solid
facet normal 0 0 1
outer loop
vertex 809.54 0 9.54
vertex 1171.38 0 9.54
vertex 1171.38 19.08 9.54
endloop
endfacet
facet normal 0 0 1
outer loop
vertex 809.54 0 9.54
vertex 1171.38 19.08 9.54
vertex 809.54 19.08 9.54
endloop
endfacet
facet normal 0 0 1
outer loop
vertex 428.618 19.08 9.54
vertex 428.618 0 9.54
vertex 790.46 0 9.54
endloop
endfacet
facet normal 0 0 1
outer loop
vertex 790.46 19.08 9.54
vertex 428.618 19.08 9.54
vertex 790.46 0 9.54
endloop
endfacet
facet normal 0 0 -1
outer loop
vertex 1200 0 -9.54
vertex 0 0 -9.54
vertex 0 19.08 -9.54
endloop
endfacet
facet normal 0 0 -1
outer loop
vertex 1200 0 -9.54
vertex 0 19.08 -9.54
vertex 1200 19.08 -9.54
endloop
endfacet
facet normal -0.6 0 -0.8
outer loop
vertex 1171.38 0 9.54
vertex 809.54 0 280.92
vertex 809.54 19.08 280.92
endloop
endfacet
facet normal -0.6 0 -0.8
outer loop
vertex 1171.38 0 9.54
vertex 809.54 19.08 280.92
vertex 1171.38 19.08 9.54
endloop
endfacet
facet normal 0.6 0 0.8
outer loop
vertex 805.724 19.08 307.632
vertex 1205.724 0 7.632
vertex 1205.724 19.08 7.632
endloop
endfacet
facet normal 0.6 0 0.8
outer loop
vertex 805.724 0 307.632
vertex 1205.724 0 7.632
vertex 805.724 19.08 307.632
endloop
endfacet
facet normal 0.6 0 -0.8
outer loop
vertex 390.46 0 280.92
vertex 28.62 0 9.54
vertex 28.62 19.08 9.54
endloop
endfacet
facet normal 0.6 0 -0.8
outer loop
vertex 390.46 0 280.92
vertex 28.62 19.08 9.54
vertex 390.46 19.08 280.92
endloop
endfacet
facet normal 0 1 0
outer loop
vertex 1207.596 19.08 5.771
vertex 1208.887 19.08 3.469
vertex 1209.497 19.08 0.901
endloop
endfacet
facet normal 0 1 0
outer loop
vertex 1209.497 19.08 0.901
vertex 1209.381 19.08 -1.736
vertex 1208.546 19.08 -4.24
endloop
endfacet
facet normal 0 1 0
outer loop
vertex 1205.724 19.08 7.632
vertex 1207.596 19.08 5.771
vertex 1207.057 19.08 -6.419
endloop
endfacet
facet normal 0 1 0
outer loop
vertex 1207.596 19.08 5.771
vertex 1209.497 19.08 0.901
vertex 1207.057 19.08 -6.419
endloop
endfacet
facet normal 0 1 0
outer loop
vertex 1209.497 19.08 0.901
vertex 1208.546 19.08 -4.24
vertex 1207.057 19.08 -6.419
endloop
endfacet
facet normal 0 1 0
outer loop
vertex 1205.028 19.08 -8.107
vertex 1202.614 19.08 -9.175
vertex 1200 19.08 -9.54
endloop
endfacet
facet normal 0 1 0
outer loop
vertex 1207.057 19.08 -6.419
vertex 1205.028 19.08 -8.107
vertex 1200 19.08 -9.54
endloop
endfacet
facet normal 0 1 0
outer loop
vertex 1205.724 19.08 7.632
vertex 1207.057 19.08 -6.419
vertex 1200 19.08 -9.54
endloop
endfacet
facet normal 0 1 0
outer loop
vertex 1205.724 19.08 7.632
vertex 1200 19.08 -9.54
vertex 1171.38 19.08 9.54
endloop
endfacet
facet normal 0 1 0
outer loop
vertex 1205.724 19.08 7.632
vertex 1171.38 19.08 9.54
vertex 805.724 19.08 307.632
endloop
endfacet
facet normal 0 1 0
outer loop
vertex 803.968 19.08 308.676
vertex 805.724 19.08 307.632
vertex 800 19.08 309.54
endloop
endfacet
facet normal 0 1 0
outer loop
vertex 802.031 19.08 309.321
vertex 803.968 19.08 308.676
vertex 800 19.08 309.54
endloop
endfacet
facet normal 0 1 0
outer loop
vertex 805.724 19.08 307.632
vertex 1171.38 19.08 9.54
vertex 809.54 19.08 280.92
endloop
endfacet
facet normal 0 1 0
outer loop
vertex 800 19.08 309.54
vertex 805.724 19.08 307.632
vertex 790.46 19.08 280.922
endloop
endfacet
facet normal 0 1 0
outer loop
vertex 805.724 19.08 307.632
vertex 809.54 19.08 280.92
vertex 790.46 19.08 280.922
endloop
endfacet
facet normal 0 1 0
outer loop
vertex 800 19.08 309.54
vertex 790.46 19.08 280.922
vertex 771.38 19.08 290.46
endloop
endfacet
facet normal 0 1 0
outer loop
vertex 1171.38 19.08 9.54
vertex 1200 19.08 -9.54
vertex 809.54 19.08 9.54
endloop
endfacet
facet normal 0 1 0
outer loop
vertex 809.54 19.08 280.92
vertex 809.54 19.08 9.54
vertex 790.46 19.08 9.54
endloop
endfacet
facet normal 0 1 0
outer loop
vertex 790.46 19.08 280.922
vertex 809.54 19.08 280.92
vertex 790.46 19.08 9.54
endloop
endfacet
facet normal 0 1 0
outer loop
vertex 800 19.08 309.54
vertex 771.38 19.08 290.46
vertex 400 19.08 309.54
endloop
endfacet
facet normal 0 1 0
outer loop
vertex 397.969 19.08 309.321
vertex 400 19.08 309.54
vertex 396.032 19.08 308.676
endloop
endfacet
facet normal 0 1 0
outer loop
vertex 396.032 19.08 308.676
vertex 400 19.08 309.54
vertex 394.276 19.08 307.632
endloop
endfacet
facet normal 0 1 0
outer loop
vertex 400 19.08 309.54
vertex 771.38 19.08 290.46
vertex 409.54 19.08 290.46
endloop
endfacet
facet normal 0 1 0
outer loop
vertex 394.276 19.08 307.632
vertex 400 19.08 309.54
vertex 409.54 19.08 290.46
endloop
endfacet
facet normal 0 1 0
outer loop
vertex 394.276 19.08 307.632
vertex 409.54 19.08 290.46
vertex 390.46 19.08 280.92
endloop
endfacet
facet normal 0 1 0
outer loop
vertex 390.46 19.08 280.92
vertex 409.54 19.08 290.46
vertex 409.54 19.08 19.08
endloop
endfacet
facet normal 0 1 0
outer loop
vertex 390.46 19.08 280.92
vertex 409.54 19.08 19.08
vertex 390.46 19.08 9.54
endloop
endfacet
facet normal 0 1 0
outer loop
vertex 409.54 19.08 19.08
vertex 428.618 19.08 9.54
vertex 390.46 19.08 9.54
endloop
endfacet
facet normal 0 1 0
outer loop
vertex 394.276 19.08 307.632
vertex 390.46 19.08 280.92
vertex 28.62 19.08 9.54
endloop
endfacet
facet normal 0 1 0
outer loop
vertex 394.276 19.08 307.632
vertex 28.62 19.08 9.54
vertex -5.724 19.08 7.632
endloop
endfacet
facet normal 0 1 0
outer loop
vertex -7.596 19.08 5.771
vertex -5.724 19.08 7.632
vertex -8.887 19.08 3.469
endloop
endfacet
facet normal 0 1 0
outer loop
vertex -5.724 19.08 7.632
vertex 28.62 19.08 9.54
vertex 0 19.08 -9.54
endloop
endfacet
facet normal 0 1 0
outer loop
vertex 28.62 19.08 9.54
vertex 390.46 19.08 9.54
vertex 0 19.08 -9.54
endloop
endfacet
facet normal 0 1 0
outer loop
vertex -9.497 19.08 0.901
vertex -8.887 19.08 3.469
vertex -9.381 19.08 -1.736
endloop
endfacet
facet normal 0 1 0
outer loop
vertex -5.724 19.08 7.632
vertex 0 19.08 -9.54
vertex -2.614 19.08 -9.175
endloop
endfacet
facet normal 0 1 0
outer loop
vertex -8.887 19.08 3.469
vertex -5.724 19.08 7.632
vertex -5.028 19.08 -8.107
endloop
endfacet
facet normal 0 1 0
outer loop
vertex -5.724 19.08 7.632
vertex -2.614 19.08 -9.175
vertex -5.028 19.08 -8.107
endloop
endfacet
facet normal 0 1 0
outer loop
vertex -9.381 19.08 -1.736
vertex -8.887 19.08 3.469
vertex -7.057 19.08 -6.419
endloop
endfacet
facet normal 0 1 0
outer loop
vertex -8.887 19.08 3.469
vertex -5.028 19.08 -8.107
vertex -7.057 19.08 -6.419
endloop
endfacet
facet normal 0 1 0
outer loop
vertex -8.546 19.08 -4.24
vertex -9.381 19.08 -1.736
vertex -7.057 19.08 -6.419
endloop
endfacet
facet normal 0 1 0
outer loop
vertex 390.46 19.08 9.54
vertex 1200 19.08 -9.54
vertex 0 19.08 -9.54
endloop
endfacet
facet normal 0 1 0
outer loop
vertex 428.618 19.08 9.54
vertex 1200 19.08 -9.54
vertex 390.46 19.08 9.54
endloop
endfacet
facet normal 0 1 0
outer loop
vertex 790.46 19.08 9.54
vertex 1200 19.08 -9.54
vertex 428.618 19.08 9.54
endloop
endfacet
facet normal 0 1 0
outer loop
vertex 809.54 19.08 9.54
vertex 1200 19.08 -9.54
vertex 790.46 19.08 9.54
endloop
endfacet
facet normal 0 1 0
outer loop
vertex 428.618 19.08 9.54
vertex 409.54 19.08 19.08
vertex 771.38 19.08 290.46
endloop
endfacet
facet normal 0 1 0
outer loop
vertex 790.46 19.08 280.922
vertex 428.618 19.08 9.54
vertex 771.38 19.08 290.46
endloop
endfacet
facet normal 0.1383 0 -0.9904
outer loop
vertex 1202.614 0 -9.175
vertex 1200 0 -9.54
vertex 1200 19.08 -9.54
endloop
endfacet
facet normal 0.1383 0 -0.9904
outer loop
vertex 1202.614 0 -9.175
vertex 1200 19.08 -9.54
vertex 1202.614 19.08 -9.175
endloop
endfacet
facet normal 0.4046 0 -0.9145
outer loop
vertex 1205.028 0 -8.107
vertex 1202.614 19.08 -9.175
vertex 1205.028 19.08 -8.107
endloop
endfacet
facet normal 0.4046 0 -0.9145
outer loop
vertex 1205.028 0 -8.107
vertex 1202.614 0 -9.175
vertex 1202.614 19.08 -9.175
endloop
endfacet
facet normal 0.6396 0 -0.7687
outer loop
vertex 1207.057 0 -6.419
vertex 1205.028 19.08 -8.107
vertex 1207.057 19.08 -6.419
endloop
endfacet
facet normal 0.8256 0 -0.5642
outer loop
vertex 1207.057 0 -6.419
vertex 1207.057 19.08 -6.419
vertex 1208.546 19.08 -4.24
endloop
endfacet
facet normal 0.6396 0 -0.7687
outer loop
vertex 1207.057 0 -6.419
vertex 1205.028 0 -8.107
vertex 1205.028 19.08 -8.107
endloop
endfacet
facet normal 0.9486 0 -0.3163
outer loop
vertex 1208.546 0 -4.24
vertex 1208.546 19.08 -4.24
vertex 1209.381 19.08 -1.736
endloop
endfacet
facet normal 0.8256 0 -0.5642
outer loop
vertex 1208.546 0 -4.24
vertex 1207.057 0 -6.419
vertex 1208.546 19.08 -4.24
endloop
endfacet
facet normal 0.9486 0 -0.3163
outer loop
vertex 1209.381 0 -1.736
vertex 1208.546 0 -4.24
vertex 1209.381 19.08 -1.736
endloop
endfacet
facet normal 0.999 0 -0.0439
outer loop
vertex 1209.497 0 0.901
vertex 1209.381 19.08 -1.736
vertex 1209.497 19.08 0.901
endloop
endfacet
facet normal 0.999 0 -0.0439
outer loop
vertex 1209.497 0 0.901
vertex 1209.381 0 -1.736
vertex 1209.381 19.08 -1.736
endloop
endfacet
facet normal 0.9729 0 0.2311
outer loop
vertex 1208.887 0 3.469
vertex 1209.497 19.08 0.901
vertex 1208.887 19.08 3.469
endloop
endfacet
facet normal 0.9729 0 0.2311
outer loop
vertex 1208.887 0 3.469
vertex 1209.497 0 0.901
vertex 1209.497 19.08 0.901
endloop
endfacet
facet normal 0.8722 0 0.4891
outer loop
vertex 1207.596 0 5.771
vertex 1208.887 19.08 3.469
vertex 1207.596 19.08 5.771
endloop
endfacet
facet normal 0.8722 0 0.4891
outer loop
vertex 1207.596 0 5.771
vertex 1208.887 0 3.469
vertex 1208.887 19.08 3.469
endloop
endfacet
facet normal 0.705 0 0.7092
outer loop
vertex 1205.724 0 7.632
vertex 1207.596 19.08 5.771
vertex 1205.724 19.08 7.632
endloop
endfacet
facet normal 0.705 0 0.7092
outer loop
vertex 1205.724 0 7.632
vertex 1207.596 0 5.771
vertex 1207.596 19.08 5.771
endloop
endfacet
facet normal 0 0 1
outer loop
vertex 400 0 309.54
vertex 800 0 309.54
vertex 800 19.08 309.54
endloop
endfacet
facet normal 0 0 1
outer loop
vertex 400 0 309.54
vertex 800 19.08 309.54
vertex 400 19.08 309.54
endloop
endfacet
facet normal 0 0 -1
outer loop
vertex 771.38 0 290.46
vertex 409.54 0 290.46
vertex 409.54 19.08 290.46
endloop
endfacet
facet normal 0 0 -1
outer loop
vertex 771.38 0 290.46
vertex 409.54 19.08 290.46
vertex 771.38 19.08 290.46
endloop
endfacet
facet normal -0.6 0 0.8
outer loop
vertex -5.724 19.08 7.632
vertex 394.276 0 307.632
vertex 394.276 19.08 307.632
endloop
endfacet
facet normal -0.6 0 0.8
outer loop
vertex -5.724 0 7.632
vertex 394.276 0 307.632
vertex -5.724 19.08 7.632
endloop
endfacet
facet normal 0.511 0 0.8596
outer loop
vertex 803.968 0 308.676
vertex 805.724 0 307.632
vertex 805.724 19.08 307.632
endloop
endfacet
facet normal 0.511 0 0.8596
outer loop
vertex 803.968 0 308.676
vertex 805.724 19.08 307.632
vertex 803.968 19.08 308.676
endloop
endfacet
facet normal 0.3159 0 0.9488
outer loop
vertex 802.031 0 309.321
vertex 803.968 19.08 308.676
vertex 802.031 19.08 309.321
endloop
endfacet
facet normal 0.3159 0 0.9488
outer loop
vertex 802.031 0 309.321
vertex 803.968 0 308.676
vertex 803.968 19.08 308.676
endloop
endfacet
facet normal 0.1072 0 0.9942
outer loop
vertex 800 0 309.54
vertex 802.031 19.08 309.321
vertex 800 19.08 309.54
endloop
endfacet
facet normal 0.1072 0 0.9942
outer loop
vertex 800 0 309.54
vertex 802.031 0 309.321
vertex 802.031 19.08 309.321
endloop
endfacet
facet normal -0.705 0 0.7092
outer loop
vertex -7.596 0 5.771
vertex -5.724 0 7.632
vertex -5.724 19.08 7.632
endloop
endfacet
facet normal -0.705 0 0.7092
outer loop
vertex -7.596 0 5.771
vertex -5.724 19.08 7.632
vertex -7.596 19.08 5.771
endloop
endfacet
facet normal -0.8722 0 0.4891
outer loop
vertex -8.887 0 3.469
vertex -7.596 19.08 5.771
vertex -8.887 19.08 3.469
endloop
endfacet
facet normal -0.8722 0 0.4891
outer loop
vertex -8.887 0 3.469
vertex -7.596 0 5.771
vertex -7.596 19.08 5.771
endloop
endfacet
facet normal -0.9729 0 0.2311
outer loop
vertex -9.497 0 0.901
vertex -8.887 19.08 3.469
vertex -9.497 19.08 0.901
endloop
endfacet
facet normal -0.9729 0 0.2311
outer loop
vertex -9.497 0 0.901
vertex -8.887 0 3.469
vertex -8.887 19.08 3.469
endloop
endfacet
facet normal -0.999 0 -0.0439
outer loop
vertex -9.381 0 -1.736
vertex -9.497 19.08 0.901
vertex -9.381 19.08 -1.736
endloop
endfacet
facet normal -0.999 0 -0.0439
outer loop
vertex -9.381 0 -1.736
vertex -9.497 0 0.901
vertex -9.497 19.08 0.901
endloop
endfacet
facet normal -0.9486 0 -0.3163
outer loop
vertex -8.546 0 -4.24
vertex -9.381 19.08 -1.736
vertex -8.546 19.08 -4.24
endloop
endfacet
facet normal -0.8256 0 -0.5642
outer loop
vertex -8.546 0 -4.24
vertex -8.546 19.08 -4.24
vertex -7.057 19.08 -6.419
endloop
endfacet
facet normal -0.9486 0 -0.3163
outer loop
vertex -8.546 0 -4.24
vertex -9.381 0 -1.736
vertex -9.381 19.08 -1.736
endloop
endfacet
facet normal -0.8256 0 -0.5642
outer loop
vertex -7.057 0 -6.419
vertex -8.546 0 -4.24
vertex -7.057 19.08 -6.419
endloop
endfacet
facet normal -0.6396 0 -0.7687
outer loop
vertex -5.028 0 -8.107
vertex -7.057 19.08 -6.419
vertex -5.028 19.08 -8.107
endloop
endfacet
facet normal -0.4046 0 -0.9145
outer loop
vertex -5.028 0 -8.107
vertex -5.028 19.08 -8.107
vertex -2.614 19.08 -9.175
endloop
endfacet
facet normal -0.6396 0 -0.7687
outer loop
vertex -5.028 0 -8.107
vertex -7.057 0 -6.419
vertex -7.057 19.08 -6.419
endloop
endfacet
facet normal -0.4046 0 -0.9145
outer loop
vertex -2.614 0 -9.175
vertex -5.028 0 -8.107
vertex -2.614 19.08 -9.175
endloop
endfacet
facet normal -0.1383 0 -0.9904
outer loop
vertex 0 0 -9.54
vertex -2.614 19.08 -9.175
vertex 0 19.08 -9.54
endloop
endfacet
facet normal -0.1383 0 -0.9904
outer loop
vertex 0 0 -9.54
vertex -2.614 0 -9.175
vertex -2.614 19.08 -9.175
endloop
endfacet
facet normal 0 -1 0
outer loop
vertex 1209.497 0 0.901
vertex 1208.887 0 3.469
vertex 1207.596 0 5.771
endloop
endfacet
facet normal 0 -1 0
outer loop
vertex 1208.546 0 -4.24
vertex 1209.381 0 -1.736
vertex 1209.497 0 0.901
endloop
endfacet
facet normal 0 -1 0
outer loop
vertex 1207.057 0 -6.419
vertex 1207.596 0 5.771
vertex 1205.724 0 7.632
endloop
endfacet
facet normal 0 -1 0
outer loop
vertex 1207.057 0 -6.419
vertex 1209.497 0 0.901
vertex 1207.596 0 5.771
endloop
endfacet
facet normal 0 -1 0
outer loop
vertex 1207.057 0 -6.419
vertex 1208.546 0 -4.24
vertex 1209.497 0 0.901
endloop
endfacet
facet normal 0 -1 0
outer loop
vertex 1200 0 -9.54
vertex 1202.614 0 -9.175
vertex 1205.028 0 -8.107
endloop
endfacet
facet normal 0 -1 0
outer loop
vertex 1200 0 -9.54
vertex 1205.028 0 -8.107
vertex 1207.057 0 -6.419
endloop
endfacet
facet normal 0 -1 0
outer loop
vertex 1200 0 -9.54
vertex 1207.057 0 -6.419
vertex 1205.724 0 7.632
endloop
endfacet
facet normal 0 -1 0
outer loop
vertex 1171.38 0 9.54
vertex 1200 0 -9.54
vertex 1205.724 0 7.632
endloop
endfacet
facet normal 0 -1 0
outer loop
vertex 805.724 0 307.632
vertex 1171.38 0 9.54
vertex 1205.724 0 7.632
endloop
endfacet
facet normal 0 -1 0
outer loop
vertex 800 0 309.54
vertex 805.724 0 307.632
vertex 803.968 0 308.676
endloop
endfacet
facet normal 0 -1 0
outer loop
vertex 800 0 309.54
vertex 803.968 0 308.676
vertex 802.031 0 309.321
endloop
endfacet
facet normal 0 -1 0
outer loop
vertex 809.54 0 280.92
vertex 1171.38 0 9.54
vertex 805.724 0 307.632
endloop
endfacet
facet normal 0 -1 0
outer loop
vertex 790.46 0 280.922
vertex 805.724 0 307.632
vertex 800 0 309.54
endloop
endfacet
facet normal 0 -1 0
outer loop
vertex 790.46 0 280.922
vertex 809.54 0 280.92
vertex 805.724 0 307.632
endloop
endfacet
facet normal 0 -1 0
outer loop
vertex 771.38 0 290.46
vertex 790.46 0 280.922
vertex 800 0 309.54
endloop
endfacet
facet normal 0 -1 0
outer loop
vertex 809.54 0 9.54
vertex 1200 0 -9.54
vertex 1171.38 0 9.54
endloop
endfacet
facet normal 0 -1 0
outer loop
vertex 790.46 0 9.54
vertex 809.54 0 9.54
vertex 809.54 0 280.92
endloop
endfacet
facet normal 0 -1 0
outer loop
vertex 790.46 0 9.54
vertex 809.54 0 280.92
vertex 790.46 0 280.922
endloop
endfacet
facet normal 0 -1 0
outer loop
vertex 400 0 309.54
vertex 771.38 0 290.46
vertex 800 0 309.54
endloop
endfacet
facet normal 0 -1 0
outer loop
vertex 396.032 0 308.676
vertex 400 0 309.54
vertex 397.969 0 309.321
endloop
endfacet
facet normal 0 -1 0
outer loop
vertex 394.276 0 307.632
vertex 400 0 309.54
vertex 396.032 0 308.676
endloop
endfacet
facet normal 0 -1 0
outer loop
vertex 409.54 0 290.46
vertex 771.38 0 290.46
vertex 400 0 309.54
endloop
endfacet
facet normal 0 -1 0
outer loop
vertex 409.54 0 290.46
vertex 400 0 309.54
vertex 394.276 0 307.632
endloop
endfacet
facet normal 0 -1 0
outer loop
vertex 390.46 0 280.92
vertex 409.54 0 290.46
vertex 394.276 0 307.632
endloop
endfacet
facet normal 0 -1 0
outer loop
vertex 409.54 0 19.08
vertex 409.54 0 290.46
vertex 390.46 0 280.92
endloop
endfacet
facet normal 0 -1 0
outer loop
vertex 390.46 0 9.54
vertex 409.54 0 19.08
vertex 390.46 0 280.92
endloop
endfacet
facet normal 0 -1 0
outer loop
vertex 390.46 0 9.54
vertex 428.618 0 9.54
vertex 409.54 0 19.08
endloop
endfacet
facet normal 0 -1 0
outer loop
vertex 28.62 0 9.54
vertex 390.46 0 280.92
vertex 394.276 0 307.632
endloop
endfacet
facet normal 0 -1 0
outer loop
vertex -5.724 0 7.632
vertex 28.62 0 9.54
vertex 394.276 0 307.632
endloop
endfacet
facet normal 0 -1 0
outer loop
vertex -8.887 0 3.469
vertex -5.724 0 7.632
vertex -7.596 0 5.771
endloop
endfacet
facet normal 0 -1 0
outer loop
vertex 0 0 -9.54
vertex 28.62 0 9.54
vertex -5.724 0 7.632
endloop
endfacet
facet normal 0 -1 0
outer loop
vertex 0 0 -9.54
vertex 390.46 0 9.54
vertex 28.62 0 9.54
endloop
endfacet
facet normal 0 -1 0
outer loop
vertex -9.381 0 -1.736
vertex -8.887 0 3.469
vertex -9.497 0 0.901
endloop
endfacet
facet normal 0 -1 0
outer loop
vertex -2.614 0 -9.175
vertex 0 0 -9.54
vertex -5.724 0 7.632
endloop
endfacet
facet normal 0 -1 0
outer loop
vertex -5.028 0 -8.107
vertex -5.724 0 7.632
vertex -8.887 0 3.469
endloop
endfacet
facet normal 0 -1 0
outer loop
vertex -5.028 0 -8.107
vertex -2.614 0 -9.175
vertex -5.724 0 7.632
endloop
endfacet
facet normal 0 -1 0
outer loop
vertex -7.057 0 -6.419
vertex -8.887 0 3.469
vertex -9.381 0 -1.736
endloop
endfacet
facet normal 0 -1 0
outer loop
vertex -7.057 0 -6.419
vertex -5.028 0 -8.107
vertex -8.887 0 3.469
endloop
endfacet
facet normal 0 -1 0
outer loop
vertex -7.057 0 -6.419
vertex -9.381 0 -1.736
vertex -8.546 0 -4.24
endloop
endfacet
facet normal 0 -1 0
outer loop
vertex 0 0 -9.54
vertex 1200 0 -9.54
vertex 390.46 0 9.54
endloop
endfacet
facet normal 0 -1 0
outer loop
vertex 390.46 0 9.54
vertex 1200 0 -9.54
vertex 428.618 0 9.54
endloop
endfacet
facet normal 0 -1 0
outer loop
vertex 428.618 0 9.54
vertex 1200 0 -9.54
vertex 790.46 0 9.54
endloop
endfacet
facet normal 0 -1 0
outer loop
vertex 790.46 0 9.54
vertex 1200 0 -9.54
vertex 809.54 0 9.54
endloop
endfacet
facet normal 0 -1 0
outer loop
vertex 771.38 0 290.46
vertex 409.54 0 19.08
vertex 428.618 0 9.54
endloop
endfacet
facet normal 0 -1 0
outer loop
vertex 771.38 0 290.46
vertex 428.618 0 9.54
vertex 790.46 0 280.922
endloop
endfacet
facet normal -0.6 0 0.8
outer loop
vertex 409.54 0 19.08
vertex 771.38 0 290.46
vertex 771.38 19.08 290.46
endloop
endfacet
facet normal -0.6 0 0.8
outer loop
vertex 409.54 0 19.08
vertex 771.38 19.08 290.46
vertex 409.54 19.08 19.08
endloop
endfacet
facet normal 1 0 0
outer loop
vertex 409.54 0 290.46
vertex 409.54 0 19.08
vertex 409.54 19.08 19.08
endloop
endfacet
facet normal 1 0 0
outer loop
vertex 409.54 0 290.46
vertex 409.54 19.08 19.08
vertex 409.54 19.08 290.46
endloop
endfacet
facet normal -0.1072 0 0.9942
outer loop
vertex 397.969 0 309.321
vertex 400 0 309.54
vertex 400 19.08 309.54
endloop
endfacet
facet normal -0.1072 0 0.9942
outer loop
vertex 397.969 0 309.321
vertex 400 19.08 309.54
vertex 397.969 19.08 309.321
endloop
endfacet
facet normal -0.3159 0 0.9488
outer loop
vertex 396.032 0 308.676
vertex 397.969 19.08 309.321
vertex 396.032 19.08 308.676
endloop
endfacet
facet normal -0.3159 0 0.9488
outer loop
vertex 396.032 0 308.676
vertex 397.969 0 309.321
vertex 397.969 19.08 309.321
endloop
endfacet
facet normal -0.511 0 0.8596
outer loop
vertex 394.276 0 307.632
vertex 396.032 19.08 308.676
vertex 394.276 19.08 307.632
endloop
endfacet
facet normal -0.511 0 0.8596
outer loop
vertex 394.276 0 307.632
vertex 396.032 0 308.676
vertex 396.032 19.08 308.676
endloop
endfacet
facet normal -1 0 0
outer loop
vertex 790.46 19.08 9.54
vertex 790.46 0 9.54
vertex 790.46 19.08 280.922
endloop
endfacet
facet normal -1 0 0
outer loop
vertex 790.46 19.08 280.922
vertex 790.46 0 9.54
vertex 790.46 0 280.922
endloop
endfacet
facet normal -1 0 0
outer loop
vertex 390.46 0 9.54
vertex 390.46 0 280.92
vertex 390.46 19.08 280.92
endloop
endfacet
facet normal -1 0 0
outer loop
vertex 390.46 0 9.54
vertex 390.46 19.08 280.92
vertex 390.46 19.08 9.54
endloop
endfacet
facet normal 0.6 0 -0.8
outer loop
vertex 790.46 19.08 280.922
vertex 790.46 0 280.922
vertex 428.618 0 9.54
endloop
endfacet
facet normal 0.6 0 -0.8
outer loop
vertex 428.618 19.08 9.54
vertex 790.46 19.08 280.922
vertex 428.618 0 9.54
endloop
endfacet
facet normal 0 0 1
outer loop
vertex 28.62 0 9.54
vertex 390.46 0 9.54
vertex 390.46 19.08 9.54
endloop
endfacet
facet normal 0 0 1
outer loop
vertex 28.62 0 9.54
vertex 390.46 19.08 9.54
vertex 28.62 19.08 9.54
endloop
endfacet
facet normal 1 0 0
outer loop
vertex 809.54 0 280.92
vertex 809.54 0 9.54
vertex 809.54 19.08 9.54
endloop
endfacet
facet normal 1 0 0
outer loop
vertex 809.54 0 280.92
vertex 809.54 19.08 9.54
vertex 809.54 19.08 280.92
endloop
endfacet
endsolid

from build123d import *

# Parameters (mm, degrees)
BOSS_EXTRUDE1_DEPTH = 19.08


with BuildPart() as part:
    # Sketch15 → Boss-Extrude1 (new body)
    with BuildSketch(Plane(origin=(0, 0, 0), x_dir=(1, 0, 0), z_dir=(0, 1, 0))):
        with BuildLine():
            Line((0, 9.54), (1200, 9.54))
            ThreePointArc((1200, 9.54), (1209.050438663, 3.016812888), (1205.724, -7.632))
            Line((1205.724, -7.632), (805.724, -307.632))
            ThreePointArc((805.724, -307.632), (803.016812888, -309.050438663), (800, -309.54))
            Line((800, -309.54), (400, -309.54))
            ThreePointArc((400, -309.54), (396.983187112, -309.050438663), (394.276, -307.632))
            Line((394.276, -307.632), (-5.724, -7.632))
            ThreePointArc((-5.724, -7.632), (-9.050438663, 3.016812888), (0, 9.54))
        make_face()
        Polygon((390.46, -280.92), (390.46, -9.54), (28.62, -9.54), align=None, mode=Mode.SUBTRACT)
        Polygon((409.54, -19.08), (409.54, -290.46), (771.38, -290.46), align=None, mode=Mode.SUBTRACT)
        Polygon((790.46, -280.921851045), (428.61753194, -9.54), (790.46, -9.54), align=None, mode=Mode.SUBTRACT)
        Polygon((809.54, -280.92), (1171.38, -9.54), (809.54, -9.54), align=None, mode=Mode.SUBTRACT)
    extrude(amount=BOSS_EXTRUDE1_DEPTH)


solid = part.part
